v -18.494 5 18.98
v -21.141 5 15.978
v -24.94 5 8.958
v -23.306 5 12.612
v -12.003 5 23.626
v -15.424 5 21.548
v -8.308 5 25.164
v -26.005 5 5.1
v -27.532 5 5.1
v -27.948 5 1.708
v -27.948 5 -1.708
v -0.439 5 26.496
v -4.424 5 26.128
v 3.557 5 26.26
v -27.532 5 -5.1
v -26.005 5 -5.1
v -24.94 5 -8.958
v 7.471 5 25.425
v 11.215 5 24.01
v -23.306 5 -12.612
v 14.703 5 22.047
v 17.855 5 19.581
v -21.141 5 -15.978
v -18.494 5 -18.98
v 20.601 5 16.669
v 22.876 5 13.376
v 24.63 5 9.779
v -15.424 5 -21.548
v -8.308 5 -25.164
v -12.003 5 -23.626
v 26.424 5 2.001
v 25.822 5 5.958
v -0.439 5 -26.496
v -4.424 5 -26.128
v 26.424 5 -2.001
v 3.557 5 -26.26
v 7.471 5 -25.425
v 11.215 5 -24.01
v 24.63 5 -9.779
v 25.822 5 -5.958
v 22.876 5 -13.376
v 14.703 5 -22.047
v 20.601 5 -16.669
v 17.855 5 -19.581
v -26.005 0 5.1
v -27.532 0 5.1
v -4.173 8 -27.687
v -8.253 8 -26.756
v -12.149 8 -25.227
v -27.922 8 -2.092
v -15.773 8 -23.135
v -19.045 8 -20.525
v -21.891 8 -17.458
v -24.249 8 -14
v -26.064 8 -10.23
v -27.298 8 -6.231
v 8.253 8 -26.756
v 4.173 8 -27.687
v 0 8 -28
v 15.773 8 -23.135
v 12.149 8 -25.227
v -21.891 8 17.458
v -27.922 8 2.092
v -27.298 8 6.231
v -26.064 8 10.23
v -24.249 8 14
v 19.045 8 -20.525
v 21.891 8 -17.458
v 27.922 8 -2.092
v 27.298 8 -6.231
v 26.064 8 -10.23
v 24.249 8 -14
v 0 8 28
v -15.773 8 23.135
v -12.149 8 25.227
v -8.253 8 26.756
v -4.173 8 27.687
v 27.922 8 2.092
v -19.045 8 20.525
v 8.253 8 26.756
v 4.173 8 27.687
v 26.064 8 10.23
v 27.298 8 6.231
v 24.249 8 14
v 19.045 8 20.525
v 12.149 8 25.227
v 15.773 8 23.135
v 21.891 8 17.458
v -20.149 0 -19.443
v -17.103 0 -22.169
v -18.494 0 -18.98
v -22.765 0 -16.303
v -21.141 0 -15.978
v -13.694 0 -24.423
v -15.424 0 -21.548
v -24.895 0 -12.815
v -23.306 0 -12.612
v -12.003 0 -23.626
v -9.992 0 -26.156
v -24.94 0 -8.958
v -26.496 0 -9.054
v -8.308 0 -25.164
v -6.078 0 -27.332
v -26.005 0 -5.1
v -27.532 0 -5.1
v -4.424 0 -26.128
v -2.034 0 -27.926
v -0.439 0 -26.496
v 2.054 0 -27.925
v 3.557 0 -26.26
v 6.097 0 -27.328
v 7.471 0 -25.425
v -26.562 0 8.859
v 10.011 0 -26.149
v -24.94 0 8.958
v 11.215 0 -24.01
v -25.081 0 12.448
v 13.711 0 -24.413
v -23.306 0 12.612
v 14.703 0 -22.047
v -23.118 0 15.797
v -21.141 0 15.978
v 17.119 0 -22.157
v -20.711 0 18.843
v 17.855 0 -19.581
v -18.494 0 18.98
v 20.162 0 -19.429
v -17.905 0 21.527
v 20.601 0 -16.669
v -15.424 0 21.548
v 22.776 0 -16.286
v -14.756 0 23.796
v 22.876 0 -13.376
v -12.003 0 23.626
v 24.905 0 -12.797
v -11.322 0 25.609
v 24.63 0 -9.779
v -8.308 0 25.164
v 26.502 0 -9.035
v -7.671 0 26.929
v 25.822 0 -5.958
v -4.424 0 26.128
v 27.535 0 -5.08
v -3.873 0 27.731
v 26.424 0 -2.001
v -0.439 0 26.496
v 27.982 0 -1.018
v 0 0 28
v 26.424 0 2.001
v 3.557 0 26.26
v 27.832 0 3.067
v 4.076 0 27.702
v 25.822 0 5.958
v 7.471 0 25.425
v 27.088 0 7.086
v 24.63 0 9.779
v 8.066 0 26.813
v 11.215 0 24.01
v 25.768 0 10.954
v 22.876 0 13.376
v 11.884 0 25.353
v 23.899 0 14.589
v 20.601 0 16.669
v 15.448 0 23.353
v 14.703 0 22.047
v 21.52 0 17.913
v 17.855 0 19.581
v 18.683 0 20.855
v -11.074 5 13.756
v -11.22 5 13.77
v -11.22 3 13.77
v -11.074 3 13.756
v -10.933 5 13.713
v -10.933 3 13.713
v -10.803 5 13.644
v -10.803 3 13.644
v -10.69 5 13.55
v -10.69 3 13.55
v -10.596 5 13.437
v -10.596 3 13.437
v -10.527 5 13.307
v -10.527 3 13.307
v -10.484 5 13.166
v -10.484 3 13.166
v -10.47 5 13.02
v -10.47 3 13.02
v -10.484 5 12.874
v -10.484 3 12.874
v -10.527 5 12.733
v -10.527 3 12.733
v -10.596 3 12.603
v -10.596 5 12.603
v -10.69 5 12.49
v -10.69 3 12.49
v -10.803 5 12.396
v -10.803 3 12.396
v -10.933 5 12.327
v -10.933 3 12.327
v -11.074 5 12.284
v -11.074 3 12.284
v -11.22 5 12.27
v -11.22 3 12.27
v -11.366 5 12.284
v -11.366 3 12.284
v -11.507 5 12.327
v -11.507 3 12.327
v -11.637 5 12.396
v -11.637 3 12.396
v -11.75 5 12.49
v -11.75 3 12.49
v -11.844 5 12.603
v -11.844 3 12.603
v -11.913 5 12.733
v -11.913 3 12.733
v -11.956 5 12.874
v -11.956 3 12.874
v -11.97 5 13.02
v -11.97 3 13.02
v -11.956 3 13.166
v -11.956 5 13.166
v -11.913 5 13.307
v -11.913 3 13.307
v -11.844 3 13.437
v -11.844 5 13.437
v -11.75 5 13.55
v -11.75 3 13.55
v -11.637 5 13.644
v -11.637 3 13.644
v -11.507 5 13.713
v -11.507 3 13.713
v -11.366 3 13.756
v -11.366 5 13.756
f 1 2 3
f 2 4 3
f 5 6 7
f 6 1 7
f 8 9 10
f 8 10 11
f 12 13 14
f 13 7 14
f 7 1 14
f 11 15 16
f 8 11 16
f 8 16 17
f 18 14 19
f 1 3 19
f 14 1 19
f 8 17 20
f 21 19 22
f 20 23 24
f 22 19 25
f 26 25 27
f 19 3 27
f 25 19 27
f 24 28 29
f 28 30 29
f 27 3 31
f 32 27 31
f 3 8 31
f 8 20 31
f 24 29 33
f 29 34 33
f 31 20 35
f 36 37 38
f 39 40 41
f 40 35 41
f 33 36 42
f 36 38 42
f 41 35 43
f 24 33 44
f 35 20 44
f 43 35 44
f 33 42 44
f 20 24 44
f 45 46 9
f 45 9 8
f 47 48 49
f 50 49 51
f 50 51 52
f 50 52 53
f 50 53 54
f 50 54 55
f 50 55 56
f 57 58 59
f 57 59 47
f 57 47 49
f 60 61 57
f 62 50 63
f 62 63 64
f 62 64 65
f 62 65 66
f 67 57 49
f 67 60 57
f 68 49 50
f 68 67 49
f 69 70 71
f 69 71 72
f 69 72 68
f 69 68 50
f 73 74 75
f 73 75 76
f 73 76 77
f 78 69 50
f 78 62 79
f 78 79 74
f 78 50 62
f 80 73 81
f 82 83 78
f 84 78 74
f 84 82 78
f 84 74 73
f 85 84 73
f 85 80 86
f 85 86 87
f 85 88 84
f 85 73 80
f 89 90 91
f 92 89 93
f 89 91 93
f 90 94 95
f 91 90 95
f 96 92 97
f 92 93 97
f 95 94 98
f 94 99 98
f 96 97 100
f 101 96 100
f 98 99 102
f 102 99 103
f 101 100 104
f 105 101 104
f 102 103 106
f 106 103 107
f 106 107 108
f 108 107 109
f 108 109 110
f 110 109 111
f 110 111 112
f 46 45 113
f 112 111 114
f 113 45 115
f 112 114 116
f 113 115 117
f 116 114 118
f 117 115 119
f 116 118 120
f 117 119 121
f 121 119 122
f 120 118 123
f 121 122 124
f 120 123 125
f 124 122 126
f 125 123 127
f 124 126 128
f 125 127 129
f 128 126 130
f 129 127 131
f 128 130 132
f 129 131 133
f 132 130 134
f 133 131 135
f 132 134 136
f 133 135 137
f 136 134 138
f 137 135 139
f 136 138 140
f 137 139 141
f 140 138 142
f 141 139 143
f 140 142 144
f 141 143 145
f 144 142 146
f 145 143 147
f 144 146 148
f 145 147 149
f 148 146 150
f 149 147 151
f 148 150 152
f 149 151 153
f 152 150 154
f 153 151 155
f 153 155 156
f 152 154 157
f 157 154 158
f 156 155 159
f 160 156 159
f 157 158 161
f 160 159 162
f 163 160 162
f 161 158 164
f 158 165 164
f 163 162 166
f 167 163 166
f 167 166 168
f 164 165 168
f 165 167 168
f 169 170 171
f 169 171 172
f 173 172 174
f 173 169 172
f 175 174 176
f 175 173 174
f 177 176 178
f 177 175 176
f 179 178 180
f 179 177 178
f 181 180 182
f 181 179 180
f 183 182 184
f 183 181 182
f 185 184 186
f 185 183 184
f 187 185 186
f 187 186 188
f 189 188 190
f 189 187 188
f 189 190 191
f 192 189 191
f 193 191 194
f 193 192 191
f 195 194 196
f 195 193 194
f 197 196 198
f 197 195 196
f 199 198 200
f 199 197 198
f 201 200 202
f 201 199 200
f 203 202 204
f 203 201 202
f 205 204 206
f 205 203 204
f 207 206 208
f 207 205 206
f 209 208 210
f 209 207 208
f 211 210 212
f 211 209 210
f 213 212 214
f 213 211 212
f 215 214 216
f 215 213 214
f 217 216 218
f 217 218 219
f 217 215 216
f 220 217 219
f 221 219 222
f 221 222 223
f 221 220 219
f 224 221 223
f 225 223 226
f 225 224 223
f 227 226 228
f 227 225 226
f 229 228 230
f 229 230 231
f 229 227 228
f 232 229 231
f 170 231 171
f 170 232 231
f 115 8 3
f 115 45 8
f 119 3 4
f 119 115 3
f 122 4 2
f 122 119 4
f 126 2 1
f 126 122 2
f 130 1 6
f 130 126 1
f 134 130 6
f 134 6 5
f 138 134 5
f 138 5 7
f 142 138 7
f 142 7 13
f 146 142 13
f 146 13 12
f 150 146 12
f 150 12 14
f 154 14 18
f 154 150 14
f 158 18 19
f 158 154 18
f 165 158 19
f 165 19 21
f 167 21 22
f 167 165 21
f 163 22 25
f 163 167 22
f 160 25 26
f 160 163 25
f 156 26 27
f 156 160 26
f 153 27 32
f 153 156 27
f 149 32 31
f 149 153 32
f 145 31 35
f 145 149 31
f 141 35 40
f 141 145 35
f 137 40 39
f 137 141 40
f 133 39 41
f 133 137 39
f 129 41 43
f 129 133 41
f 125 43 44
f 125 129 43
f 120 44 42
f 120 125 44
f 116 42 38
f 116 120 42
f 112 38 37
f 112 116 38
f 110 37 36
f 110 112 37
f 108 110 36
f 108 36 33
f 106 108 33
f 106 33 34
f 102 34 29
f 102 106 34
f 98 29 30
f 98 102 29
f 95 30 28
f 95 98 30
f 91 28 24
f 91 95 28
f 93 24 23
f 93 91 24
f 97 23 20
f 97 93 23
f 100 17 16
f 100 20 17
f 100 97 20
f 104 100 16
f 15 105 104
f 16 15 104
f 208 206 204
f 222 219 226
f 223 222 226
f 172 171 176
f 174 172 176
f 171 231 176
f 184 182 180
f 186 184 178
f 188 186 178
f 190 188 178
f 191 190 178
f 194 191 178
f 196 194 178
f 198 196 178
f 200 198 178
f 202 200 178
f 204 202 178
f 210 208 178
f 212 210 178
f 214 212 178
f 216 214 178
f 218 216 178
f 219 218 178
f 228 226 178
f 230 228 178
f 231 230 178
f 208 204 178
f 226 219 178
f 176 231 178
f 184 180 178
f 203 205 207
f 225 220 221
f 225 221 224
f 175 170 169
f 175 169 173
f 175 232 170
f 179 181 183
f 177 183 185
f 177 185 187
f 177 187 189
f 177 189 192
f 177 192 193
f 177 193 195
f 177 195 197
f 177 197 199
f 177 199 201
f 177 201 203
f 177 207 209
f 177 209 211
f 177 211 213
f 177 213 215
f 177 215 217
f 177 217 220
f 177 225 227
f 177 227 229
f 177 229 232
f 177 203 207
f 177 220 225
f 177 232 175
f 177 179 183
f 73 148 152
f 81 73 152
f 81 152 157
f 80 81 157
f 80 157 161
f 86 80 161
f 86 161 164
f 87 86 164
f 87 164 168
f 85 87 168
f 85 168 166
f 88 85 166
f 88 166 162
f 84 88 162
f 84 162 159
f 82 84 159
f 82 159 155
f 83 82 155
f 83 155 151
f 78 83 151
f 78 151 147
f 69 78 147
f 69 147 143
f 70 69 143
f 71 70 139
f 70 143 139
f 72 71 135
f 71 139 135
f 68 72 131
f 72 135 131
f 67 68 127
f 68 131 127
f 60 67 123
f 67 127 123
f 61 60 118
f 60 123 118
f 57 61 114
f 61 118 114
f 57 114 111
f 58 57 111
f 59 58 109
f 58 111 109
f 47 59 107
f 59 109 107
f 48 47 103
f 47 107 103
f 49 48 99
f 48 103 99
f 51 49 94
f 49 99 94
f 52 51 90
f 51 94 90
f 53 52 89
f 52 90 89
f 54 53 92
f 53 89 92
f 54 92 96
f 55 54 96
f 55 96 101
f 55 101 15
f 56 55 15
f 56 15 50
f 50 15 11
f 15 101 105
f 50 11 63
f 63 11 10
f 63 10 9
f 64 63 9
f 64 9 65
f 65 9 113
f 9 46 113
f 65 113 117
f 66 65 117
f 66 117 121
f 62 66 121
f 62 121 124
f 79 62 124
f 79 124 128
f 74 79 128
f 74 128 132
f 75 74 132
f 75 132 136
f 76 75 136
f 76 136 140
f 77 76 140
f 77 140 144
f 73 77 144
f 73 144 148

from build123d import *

# Parameters (mm, degrees)
BASE_R                    = 28
EXTRUSAO_BASE_DEPTH       = 8
CORTE_BASE_R              = 26.5
EXTRUSAO_CORTE_BASE_DEPTH = 5
USB_W                     = 142.526664036
USB_H                     = 10.2
CORTE_USB_DEPTH           = 5
EXTRUSAO_SUPORTE_START    = 5
SUPORTE_R                 = 0.75
EXTRUSAO_SUPORTE_DEPTH    = 2


with BuildPart() as part:
    # base → extrusao_base (new body)
    with BuildSketch(Plane(origin=(0, 0, 0), x_dir=(1, 0, 0), z_dir=(0, 1, 0))):
        with Locations(Location((0, 0, 0), (0, 0, 270))):
            Circle(BASE_R)
    extrude(amount=EXTRUSAO_BASE_DEPTH)

    # corte_base → extrusao_corte_base (cut)
    with BuildSketch(Plane(origin=(0, 0, 0), x_dir=(1, 0, 0), z_dir=(0, 1, 0))):
        with Locations(Location((0, 0, 0), (0, 0, 270))):
            Circle(CORTE_BASE_R)
    extrude(amount=EXTRUSAO_CORTE_BASE_DEPTH, mode=Mode.SUBTRACT)

    # usb → corte_usb (cut)
    with BuildSketch(Plane(origin=(0, 0, 0), x_dir=(1, 0, 0), z_dir=(0, 1, 0))):
        with Locations((-71.263332018, 0)):
            Rectangle(USB_W, USB_H)
    extrude(amount=CORTE_USB_DEPTH, mode=Mode.SUBTRACT)


with BuildPart() as body_2:
    # suporte → extrusao_suporte (new body)
    with BuildSketch(Plane(origin=(0, 0, 0), x_dir=(1, 0, 0), z_dir=(0, 1, 0)).offset(EXTRUSAO_SUPORTE_START)):
        with Locations(Location((-11.22, -13.02, 0), (0, 0, 270))):
            Circle(SUPORTE_R)
    extrude(amount=-EXTRUSAO_SUPORTE_DEPTH)


solid = Compound([part.part, body_2.part])
